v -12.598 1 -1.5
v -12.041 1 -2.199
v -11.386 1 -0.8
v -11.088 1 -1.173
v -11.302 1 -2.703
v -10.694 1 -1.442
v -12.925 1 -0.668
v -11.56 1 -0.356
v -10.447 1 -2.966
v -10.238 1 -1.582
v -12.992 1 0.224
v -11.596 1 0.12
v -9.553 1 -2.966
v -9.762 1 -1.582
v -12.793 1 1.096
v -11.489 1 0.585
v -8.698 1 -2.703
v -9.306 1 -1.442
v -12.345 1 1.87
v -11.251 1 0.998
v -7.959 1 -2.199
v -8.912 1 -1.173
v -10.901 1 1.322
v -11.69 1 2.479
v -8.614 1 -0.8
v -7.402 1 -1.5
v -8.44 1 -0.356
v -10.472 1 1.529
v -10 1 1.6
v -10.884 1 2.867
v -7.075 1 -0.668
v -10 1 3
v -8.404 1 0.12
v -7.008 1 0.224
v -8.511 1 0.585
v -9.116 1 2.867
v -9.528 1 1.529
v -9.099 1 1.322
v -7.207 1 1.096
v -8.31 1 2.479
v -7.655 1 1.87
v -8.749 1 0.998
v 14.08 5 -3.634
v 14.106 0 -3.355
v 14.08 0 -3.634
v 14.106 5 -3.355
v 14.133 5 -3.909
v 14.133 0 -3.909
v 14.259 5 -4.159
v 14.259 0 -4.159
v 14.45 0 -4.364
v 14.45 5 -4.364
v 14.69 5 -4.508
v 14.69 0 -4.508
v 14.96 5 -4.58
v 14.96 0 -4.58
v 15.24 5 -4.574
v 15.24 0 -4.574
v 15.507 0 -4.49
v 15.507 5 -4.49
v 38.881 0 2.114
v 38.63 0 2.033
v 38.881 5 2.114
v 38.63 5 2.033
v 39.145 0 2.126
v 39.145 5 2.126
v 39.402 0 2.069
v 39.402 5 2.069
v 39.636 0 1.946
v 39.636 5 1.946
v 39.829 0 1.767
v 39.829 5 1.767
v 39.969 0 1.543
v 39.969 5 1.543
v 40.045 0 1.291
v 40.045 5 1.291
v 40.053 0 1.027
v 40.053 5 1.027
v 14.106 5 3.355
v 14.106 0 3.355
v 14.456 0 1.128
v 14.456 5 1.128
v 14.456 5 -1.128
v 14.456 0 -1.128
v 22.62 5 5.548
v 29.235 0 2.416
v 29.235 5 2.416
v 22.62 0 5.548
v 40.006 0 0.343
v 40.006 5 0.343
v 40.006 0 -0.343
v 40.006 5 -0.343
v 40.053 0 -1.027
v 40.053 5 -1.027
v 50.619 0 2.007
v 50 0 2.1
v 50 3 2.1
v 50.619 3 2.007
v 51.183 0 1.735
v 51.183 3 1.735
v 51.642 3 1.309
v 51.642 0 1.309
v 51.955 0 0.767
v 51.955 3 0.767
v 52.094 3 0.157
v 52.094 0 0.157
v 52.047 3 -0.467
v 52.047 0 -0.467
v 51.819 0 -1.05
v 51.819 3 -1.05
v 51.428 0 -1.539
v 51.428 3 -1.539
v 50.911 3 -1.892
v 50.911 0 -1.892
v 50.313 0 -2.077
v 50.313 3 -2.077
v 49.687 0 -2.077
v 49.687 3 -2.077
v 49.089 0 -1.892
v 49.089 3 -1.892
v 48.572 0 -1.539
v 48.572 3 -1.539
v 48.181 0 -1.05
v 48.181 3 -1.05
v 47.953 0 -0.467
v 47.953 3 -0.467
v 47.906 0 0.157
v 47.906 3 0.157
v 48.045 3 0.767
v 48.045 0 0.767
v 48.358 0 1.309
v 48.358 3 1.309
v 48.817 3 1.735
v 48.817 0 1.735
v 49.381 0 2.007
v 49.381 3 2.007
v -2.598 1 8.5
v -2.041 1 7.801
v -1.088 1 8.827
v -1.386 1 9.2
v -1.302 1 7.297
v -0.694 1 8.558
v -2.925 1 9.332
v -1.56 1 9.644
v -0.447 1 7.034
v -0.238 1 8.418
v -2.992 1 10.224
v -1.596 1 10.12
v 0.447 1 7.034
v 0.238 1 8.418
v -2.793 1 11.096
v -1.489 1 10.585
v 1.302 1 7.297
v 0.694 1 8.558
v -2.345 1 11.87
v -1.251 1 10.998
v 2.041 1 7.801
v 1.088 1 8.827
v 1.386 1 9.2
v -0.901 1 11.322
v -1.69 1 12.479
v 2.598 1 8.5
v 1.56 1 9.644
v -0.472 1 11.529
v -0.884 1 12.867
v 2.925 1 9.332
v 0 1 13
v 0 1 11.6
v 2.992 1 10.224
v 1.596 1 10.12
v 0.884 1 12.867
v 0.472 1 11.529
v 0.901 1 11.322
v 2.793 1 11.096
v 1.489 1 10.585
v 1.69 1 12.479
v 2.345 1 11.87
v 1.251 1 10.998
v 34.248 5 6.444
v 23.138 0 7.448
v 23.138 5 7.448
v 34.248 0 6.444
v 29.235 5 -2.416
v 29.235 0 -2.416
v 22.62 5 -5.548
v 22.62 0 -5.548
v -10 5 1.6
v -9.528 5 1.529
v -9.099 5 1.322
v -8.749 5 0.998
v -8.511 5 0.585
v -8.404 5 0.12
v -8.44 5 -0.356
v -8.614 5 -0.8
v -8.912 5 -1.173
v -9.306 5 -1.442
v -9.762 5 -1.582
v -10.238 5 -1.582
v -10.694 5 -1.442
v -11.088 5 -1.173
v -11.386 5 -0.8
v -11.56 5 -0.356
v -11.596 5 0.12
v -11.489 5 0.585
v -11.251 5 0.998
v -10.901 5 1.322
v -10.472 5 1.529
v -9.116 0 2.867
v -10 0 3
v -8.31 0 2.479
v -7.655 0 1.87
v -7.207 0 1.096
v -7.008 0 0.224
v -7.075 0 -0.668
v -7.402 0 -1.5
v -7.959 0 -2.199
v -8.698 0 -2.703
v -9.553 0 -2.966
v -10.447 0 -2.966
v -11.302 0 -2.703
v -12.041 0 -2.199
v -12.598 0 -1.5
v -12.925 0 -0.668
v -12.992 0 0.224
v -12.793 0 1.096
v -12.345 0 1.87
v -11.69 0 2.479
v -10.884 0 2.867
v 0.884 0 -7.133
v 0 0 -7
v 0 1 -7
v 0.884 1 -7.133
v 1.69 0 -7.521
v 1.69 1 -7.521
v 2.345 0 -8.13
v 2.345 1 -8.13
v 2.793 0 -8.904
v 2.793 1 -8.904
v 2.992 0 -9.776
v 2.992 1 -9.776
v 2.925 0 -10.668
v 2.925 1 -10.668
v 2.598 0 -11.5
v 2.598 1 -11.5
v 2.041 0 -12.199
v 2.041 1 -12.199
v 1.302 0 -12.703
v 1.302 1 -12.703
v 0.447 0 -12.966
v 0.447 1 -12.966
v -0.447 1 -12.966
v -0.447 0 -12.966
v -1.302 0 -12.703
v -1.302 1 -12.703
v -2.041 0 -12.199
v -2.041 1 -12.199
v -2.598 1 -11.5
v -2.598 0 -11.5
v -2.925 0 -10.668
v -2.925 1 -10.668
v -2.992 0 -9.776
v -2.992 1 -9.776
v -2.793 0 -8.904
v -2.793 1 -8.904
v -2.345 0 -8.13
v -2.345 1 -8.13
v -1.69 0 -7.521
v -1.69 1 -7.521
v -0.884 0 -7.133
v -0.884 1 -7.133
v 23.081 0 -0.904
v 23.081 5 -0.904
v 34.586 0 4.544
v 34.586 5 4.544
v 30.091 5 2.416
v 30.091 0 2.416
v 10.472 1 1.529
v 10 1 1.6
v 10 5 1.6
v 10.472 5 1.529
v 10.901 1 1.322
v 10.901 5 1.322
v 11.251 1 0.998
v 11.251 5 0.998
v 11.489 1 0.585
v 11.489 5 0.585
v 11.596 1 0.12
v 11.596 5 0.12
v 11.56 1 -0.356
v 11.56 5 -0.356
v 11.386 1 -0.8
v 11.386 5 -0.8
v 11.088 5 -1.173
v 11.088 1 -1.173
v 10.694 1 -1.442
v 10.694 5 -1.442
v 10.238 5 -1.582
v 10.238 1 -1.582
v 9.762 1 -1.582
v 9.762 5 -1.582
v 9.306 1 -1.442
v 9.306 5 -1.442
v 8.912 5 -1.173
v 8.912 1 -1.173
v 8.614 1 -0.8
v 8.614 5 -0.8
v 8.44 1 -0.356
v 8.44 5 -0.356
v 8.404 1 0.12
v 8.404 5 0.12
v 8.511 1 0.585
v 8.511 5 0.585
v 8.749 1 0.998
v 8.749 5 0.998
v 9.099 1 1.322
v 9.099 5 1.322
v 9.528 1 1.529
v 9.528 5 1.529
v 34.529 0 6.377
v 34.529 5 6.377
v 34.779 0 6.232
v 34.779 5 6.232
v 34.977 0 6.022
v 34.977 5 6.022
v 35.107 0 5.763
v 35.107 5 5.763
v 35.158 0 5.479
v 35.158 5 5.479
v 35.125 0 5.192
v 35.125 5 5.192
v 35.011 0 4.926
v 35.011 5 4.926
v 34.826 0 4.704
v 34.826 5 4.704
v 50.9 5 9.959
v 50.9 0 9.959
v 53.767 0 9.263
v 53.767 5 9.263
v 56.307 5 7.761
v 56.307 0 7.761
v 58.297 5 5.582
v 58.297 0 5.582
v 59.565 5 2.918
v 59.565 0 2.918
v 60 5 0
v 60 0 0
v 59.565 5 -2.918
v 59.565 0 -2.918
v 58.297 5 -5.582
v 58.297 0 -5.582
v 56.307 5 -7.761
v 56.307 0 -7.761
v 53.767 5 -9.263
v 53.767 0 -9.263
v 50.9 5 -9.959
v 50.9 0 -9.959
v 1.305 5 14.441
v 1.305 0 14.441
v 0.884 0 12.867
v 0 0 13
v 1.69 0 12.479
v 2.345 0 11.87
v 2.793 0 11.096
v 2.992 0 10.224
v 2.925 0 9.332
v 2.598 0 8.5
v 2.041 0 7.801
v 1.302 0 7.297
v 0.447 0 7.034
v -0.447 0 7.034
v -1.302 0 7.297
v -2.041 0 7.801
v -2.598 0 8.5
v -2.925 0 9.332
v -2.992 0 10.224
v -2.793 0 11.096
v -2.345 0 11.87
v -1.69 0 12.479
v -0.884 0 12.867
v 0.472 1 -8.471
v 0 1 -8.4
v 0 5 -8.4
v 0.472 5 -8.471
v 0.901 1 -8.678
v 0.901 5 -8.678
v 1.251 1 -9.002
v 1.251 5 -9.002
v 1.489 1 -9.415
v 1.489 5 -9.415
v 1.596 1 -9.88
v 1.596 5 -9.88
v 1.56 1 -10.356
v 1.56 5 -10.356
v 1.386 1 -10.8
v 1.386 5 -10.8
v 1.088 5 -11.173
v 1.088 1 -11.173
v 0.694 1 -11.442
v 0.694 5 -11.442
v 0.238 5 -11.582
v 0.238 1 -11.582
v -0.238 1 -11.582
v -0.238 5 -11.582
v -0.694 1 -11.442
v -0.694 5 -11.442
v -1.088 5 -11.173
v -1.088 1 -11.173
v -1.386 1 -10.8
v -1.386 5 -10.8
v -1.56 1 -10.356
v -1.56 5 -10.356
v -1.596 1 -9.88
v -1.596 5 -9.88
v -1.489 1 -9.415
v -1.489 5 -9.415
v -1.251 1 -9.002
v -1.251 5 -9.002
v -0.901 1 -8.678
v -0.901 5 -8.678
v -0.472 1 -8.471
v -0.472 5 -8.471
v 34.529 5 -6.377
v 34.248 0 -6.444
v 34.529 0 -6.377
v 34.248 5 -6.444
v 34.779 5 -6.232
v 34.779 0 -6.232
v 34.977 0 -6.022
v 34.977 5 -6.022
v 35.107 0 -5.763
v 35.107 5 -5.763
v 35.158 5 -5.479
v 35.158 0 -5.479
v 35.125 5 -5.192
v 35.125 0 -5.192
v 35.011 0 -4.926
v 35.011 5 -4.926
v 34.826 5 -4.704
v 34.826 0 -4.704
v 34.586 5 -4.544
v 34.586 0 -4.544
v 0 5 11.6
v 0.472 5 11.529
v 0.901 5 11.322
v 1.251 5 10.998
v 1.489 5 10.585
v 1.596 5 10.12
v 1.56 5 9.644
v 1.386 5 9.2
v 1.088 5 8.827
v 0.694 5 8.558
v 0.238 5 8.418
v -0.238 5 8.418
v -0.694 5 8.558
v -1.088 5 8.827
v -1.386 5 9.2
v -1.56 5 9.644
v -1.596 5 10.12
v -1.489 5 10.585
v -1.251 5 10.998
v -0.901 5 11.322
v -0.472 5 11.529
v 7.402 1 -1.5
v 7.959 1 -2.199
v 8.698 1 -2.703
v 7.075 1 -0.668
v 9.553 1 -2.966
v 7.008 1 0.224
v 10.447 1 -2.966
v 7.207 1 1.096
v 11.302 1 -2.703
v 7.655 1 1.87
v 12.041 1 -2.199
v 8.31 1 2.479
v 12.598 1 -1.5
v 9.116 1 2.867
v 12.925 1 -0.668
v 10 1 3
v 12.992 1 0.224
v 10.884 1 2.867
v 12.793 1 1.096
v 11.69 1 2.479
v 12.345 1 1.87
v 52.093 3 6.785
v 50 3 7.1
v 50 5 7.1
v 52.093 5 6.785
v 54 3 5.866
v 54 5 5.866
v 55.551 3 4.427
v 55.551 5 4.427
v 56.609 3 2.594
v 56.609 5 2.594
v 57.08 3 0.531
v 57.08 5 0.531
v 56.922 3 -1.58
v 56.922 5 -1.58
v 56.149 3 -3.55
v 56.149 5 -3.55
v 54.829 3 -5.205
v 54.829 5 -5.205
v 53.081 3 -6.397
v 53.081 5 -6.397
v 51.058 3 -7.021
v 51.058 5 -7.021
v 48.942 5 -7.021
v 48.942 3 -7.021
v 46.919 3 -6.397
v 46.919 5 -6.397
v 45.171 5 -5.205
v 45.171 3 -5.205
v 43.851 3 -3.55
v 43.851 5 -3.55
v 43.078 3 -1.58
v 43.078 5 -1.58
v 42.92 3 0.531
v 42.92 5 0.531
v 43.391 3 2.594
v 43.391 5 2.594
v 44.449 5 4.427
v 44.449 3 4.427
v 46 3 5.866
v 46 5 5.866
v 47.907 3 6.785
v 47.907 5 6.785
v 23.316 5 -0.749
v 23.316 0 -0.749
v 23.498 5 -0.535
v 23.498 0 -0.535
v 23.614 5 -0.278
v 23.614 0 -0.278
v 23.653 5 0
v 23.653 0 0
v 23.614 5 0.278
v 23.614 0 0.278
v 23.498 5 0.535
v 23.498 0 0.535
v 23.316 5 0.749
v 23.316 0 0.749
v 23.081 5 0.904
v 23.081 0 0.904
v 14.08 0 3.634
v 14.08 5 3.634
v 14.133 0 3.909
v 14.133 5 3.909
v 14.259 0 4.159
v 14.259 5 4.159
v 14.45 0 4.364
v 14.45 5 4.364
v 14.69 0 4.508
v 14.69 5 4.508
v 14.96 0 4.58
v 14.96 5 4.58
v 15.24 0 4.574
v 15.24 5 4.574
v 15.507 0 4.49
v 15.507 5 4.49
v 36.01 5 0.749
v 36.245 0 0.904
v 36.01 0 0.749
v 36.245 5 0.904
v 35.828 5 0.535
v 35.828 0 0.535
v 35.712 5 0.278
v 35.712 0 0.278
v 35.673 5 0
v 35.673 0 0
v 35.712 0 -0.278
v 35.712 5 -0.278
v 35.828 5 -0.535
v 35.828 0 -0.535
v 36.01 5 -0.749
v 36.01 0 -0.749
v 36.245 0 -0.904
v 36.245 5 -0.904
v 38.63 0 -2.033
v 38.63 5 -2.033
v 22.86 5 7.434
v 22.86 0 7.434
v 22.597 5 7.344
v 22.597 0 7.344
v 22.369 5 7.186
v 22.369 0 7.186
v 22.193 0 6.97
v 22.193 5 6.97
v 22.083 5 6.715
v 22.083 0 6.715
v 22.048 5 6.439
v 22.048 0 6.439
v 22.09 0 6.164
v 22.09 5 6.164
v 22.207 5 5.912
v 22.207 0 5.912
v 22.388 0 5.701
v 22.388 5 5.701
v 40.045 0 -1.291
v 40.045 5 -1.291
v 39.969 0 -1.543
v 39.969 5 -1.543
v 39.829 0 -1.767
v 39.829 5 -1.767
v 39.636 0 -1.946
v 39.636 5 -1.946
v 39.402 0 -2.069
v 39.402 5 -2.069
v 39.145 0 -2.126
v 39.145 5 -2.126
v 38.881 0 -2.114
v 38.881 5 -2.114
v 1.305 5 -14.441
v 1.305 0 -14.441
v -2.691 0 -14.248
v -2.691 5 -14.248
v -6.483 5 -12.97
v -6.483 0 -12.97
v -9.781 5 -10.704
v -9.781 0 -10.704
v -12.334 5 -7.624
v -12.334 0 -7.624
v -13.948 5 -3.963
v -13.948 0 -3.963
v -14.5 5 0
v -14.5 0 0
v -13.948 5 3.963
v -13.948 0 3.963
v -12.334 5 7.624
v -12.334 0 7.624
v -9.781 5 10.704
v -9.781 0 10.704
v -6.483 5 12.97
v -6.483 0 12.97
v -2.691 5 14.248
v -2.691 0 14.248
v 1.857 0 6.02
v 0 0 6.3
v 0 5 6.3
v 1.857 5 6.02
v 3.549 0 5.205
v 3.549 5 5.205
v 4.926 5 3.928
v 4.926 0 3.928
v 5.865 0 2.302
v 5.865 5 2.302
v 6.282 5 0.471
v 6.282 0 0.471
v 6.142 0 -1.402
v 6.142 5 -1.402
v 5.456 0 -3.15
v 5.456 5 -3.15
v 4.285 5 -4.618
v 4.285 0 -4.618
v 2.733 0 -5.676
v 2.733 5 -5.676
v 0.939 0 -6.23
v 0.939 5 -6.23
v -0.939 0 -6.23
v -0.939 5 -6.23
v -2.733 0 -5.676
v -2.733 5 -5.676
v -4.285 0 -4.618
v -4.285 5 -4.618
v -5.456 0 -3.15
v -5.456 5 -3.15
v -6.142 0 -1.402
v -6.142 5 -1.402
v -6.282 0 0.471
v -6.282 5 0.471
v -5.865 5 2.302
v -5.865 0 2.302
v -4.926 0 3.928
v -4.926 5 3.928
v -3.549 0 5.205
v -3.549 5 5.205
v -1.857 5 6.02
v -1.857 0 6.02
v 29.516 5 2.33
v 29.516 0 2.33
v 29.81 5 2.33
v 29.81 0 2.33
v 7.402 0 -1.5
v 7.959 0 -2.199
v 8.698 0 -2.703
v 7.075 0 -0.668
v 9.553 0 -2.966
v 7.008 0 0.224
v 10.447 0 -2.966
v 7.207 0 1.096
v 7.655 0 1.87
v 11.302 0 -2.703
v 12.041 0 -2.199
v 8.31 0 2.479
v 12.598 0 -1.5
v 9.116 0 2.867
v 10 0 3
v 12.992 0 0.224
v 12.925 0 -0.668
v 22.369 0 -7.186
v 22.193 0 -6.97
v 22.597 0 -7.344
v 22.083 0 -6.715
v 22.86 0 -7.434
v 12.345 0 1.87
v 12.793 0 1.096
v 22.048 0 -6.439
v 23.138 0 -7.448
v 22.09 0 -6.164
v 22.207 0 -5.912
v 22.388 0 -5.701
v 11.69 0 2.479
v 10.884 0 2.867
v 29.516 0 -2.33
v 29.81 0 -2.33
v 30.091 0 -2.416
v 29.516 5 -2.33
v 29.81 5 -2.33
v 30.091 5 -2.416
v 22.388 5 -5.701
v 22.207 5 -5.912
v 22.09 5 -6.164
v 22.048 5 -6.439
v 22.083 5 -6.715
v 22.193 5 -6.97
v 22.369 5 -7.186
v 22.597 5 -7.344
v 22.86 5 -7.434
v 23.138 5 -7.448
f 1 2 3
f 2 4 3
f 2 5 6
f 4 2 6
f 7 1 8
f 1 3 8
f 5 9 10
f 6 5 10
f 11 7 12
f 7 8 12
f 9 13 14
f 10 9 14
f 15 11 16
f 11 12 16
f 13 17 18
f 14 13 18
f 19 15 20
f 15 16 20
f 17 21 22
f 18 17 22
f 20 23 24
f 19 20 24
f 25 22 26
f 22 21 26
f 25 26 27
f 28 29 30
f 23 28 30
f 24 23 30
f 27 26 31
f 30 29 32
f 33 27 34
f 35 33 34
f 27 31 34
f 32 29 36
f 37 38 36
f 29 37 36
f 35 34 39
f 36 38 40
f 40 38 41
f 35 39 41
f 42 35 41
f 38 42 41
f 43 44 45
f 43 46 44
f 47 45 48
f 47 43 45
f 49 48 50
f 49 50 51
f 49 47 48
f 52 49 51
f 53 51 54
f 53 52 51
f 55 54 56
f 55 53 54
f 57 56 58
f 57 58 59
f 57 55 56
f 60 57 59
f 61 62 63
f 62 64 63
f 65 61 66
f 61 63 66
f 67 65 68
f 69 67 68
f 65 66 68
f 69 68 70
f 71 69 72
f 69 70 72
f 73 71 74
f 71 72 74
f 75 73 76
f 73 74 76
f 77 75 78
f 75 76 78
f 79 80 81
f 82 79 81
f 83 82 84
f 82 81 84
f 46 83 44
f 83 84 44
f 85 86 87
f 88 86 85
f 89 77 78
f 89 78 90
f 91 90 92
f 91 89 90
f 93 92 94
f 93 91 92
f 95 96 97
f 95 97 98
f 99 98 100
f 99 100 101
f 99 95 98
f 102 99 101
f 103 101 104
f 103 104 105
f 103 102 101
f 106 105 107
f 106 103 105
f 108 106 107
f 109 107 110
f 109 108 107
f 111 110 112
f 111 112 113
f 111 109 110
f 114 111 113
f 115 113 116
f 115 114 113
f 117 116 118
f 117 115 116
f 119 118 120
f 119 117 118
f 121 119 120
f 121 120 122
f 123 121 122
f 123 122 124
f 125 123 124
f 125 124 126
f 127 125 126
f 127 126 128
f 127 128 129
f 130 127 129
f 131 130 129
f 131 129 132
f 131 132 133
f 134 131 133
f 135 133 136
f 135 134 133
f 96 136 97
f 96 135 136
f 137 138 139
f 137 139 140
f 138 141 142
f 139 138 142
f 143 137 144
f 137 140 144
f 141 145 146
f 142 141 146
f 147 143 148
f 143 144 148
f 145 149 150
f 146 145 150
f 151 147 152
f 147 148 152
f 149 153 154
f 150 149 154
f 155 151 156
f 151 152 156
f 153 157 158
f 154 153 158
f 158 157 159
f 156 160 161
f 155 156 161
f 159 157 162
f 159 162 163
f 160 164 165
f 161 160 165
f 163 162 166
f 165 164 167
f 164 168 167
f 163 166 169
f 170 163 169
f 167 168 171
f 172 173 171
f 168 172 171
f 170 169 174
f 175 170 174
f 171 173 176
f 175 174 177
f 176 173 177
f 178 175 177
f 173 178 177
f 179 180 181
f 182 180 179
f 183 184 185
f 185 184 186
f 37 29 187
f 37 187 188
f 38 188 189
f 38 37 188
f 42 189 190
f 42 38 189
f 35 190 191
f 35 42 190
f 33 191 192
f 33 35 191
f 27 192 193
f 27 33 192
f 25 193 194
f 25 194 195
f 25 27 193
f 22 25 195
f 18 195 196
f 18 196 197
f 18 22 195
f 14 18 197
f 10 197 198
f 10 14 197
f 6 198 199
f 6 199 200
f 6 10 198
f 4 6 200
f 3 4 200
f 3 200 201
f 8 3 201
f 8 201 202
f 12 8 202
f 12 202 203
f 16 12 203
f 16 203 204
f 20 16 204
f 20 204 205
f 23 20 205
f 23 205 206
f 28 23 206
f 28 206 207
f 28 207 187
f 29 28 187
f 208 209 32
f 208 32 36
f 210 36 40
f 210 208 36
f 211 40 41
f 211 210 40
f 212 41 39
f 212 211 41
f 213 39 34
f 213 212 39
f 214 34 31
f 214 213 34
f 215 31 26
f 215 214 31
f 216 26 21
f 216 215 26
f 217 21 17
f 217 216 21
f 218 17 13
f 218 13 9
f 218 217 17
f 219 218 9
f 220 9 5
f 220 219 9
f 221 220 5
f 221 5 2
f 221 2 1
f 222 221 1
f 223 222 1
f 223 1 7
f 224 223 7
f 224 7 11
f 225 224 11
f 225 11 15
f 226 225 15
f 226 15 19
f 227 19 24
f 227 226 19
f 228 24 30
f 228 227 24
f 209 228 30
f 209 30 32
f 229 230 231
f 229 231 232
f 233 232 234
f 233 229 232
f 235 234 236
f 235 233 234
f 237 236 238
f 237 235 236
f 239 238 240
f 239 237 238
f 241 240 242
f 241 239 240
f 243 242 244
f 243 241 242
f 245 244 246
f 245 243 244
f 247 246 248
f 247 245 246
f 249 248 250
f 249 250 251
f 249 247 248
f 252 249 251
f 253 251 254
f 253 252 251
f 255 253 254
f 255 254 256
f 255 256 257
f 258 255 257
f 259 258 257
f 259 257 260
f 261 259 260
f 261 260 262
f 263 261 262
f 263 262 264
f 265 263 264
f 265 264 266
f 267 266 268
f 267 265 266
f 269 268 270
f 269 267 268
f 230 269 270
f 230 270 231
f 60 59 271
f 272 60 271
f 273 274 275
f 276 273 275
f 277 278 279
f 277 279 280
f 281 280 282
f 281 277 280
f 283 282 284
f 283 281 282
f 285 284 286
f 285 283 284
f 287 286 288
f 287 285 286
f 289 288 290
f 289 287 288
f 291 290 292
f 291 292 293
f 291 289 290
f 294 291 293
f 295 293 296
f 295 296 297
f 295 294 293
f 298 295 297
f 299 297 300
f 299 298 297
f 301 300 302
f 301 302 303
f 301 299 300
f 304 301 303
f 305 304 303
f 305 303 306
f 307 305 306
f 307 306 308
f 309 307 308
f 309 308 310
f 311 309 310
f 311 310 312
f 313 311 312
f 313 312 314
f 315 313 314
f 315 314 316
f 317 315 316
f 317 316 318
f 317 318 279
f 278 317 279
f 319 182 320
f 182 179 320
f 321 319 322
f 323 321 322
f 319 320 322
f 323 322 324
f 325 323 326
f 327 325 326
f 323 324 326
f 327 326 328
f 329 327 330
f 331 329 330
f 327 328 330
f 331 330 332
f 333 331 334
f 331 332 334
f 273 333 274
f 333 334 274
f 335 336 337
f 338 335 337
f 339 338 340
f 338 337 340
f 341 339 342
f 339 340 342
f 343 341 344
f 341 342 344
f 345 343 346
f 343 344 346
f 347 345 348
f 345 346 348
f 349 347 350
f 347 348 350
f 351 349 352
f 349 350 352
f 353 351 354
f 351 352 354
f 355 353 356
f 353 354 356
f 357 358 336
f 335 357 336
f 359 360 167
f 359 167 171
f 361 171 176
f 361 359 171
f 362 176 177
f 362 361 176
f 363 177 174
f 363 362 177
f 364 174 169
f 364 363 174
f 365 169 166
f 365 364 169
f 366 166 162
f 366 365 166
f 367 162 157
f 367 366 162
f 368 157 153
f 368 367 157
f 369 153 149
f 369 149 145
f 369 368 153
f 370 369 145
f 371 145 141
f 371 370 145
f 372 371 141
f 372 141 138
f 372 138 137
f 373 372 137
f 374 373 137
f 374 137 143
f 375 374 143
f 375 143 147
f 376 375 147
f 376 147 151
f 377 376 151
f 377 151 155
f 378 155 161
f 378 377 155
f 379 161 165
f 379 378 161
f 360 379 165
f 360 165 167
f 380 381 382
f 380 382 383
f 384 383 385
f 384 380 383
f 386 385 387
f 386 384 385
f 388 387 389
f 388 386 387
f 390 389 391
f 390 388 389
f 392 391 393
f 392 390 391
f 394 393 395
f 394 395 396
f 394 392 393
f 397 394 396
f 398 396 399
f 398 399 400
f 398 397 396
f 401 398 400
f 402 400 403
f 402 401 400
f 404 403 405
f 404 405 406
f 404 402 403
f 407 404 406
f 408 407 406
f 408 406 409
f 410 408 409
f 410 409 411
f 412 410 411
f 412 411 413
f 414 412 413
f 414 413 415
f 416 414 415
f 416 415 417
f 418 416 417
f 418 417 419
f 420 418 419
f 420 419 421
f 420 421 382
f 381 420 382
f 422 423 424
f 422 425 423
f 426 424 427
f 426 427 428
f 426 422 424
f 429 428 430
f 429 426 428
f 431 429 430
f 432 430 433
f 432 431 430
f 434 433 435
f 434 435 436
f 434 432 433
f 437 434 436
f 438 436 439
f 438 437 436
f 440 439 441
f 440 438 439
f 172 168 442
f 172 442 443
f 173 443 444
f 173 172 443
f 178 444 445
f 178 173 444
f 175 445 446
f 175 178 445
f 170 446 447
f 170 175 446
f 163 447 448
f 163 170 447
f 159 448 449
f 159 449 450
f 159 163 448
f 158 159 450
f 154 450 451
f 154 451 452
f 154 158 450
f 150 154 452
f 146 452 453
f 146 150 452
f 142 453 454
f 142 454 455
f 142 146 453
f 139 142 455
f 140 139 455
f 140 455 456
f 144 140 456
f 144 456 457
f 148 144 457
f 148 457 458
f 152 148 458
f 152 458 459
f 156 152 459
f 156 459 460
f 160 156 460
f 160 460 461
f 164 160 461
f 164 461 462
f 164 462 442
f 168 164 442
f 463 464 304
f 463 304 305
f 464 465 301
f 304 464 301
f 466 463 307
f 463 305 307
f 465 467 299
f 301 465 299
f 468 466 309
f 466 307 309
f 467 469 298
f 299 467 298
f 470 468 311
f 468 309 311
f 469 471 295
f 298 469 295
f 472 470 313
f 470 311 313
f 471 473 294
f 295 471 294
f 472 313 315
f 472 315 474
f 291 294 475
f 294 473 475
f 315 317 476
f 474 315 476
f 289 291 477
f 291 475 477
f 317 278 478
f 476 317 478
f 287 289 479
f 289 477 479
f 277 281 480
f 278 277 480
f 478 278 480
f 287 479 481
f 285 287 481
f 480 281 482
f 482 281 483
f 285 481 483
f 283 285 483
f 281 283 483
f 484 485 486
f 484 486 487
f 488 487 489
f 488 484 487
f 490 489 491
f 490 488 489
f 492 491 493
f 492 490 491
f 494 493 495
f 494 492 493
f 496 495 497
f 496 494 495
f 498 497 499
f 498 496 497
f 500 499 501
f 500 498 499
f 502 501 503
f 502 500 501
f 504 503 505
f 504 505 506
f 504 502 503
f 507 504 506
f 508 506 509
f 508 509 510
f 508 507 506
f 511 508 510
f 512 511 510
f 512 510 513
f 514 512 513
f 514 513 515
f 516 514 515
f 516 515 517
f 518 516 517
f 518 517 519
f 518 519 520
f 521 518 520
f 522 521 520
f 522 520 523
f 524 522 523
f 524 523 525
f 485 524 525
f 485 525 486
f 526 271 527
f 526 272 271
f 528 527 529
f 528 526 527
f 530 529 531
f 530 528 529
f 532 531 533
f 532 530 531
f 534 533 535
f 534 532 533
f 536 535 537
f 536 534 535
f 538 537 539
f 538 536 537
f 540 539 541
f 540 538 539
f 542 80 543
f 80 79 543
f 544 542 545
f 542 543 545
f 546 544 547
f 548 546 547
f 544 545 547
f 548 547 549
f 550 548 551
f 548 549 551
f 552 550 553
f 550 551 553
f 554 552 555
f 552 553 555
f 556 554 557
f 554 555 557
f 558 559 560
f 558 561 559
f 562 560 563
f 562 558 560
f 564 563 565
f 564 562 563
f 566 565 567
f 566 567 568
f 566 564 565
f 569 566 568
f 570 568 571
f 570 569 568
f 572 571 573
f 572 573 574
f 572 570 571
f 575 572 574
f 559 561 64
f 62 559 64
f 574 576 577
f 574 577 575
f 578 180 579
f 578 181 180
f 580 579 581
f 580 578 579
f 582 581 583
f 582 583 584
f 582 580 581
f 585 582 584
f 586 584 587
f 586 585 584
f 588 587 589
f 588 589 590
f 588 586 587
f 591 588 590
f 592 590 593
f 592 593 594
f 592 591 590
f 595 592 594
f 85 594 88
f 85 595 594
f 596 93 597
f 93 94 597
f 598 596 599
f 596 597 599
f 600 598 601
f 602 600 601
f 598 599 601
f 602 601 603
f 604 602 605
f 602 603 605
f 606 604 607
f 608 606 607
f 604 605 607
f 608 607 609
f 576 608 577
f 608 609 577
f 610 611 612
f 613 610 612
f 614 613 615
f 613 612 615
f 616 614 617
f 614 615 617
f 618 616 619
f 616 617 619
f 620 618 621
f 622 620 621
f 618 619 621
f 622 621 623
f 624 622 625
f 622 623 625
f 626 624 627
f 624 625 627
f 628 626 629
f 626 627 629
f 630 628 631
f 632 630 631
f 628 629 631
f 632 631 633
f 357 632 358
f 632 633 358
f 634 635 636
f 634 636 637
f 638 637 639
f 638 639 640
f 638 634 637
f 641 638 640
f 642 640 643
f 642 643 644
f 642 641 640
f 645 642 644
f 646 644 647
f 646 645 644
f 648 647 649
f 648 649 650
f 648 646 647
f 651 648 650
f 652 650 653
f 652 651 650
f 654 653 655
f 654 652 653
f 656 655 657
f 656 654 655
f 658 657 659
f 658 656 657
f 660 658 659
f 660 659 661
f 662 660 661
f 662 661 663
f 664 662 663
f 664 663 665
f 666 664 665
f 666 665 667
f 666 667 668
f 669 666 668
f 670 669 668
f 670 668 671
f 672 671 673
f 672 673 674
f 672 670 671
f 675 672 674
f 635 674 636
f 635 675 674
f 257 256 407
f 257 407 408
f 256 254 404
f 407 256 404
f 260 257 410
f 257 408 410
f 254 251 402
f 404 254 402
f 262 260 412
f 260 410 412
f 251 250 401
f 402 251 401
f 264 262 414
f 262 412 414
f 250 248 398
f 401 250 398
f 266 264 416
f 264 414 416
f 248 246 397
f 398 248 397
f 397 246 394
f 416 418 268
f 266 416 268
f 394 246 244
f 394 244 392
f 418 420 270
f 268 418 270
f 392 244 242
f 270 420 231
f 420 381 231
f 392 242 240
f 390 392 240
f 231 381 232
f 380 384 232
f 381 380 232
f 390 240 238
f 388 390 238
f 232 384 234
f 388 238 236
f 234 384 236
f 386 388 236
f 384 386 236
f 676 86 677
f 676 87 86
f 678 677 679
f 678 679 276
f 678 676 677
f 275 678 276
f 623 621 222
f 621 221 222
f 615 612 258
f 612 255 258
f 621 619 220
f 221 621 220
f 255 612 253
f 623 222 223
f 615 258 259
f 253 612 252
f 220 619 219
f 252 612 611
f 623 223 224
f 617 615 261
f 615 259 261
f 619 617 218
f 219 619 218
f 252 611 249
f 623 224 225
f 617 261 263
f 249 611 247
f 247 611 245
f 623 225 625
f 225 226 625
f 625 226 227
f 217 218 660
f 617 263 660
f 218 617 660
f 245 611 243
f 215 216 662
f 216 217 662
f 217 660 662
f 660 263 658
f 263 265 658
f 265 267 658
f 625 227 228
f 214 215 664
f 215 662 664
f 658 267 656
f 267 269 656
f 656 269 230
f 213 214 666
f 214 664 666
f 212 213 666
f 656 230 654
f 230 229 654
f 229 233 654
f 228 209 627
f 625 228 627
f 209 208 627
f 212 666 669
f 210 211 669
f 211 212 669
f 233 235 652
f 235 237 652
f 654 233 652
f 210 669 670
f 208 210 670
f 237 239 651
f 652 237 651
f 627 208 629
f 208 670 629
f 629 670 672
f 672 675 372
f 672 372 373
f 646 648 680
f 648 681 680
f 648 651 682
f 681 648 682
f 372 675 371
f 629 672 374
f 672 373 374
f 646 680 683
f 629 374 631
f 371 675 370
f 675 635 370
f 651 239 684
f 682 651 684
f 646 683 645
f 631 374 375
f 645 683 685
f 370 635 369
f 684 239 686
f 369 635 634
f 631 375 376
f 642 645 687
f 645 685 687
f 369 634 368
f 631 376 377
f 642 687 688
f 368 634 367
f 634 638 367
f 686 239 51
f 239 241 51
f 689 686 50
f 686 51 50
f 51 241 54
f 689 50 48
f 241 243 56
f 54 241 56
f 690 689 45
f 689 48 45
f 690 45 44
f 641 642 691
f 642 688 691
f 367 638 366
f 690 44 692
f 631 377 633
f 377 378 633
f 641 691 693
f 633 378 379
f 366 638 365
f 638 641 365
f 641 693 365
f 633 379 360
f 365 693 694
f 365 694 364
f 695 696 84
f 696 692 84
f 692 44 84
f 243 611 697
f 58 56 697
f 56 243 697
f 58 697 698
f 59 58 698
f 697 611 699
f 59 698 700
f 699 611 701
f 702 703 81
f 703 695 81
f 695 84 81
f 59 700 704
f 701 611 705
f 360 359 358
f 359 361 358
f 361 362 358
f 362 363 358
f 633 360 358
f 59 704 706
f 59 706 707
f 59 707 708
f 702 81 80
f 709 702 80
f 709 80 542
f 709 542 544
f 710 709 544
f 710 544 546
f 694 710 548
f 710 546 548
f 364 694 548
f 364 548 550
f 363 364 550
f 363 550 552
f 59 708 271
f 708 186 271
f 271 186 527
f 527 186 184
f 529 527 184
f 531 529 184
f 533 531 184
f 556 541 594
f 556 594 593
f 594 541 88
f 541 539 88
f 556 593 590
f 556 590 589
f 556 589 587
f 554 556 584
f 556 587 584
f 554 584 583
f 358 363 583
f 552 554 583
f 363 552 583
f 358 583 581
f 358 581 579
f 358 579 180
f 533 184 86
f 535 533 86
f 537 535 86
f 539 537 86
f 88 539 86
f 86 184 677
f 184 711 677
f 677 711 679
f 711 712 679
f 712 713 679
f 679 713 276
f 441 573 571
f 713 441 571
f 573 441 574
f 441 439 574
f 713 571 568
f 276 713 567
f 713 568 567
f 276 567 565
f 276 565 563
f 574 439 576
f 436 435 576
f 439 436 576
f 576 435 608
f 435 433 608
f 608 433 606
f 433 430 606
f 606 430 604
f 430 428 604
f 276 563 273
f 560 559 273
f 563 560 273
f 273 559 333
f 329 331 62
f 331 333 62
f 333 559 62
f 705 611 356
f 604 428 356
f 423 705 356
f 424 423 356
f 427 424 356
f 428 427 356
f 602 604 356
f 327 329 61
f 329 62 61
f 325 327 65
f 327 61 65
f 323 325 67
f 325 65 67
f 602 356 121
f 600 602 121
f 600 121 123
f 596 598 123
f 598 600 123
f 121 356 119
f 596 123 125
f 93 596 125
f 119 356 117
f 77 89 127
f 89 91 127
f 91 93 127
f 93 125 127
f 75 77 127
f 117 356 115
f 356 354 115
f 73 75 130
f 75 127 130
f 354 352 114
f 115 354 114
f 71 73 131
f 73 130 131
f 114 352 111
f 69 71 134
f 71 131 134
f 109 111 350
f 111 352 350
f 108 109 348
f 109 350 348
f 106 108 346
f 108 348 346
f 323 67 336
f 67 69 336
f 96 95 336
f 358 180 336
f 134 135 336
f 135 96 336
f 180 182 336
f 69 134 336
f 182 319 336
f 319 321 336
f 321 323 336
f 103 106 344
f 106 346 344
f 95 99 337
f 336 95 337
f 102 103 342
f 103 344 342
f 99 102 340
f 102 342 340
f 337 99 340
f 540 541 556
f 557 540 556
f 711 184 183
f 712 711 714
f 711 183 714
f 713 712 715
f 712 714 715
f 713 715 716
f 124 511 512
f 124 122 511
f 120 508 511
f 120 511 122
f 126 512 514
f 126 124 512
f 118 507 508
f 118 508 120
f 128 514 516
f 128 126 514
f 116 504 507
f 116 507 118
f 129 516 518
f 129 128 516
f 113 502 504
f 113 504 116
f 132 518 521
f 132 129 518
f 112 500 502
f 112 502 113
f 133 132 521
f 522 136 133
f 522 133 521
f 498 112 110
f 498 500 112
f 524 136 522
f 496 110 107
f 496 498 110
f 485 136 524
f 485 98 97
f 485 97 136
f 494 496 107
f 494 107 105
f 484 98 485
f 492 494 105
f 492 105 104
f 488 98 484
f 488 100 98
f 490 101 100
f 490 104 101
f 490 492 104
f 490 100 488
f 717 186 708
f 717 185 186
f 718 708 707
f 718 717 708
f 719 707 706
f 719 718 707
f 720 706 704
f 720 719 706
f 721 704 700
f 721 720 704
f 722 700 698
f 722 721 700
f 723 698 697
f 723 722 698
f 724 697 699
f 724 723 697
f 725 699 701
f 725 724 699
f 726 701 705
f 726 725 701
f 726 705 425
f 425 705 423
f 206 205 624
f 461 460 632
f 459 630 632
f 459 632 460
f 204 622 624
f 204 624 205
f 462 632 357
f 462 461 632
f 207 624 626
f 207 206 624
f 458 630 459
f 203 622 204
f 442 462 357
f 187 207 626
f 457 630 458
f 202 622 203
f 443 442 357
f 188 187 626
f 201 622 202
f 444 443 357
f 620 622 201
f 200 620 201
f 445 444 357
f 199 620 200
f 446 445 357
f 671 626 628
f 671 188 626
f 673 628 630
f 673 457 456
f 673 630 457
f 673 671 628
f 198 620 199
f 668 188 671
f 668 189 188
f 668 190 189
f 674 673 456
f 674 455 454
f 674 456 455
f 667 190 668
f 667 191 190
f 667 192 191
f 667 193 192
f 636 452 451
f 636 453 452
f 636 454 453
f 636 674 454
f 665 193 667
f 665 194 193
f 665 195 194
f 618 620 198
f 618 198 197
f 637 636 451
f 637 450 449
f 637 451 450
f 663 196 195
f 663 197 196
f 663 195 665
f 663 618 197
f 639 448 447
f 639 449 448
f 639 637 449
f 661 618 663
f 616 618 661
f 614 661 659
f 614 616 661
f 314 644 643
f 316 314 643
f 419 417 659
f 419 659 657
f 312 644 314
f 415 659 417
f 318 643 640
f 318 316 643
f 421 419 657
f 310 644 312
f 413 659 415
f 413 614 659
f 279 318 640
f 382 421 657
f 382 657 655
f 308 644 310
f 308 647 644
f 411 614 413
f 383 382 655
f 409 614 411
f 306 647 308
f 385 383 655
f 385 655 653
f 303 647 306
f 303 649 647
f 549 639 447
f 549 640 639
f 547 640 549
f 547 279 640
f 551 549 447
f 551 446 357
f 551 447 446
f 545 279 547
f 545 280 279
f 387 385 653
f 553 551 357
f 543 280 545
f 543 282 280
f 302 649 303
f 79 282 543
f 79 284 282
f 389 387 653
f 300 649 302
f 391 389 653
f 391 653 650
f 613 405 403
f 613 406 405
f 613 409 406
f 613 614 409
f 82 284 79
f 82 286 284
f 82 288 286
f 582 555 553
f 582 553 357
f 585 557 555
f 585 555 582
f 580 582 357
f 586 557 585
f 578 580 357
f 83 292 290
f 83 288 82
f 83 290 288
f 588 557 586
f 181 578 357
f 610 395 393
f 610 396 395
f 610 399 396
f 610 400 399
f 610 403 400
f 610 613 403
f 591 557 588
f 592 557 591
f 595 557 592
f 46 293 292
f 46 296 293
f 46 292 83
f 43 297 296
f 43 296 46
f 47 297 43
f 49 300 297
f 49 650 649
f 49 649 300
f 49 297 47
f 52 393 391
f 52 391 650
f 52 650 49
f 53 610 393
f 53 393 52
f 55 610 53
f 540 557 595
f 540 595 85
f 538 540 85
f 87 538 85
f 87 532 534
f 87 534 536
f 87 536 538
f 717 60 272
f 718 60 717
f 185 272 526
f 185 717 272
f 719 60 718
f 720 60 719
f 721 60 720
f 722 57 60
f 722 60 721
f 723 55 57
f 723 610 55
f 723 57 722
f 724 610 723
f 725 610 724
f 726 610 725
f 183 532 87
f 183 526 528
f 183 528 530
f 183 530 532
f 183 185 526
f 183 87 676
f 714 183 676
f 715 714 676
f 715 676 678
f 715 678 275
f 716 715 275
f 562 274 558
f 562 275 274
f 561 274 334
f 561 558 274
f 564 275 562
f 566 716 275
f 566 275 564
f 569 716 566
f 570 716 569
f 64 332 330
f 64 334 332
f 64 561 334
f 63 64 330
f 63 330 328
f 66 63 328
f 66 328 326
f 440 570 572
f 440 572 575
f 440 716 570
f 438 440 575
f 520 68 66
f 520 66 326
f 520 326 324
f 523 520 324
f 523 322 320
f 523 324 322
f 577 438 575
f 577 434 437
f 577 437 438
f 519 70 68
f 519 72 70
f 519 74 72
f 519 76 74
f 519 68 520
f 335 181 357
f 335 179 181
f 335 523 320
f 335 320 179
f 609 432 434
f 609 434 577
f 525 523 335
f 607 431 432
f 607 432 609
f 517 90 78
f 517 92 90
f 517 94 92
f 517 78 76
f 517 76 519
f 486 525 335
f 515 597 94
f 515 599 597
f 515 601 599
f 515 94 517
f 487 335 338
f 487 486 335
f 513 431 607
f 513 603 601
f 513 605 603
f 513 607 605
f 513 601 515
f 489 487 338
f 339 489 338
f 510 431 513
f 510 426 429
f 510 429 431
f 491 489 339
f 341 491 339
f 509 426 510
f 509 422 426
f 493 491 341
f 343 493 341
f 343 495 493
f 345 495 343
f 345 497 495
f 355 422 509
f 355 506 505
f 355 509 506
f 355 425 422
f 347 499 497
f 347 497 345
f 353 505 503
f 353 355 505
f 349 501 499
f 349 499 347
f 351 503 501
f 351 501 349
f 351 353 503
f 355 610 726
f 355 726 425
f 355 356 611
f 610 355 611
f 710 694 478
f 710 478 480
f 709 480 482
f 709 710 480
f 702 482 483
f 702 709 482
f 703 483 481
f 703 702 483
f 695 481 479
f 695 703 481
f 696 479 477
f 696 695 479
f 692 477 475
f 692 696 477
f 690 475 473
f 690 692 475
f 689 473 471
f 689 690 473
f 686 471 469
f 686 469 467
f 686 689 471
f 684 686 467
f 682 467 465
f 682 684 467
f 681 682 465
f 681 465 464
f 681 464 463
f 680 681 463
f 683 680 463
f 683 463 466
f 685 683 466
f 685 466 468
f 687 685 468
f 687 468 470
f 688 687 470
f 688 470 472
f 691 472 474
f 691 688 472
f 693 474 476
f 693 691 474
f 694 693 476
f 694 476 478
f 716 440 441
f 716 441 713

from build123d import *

# Parameters (mm, degrees)
SKETCH_1_R          = 1.6
SKETCH_1_R_2        = 6.3
SKETCH_1_R_3        = 7.1
EXTRUDE_1_DEPTH     = 5
SKETCH_1_3_R        = 7.1
SKETCH_1_3_R_2      = 2.1
EXTRUDE_2_DEPTH     = 3
FILLET_1_R          = 1
FILLET_2_R          = 1
FILLET_3_R          = 1
FILLET_4_R          = 1
SKETCH_2_R          = 3
CUT_EXTRUDE_1_DEPTH = 1


with BuildPart() as part:
    # 草图1 → 凸台-拉伸1 (new body)
    with BuildSketch(Plane(origin=(0, 0, 0), x_dir=(1, 0, 0), z_dir=(0, 1, 0))):
        with BuildLine():
            ThreePointArc((1.305, 14.441155598), (-14.5, 0), (1.305, -14.441155598))
            Line((1.305, -14.441155598), (50.9, -9.959417654))
            ThreePointArc((50.9, -9.959417654), (60, 0), (50.9, 9.959417654))
            Line((50.9, 9.959417654), (1.305, 14.441155598))
        make_face()
        with Locations((0, -10)):
            Circle(SKETCH_1_R, mode=Mode.SUBTRACT)
        with Locations((-10, 0)):
            Circle(SKETCH_1_R, mode=Mode.SUBTRACT)
        Circle(SKETCH_1_R_2, mode=Mode.SUBTRACT)
        with Locations((10, 0)):
            Circle(SKETCH_1_R, mode=Mode.SUBTRACT)
        with BuildLine():
            ThreePointArc((13.42623574, -5.475965106), (14.5, 0), (13.42623574, 5.475965106))
            Line((13.42623574, 5.475965106), (24.990033856, 0))
            Line((24.990033856, 0), (13.42623574, -5.475965106))
        make_face(mode=Mode.SUBTRACT)
        Polygon((37.900667884, -6.113750926), (17.540160593, -7.953663379), (29.663119838, -2.212910976), align=None, mode=Mode.SUBTRACT)
        with Locations((50, 0)):
            Circle(SKETCH_1_R_3, mode=Mode.SUBTRACT)
        with Locations((0, 10)):
            Circle(SKETCH_1_R, mode=Mode.SUBTRACT)
        with BuildLine():
            Line((40.424641065, -2.88314087), (34.33620582, 0))
            Line((34.33620582, 0), (40.424641065, 2.88314087))
            ThreePointArc((40.424641065, 2.88314087), (40, 0), (40.424641065, -2.88314087))
        make_face(mode=Mode.SUBTRACT)
        Polygon((29.663119838, 2.212910976), (17.540160593, 7.953663379), (37.900667884, 6.113750926), align=None, mode=Mode.SUBTRACT)
    extrude(amount=EXTRUDE_1_DEPTH)

    # 草图1<3> → 凸台-拉伸2 (add)
    with BuildSketch(Plane(origin=(0, 0, 0), x_dir=(1, 0, 0), z_dir=(0, 1, 0))):
        with Locations((50, 0)):
            Circle(SKETCH_1_3_R)
        with Locations((50, 0)):
            Circle(SKETCH_1_3_R_2, mode=Mode.SUBTRACT)
    extrude(amount=EXTRUDE_2_DEPTH)

    # 圆角1
    fillet_1_edges = [part.edges().sort_by_distance(p)[0] for p in [
        (34.33620582, 2.5, 0),
        (40.424641065, 2.5, -2.88314087),
        (40.424641065, 2.5, 2.88314087),
    ]]
    fillet(fillet_1_edges, radius=FILLET_1_R)

    # 圆角2
    fillet_2_edges = [part.edges().sort_by_distance(p)[0] for p in [
        (29.663119838, 2.5, 2.212910976),
        (17.540160593, 2.5, 7.953663379),
        (37.900667884, 2.5, 6.113750926),
    ]]
    fillet(fillet_2_edges, radius=FILLET_2_R)

    # 圆角3
    fillet_3_edges = [part.edges().sort_by_distance(p)[0] for p in [
        (17.540160593, 2.5, -7.953663379),
        (29.663119838, 2.5, -2.212910976),
        (37.900667884, 2.5, -6.113750926),
    ]]
    fillet(fillet_3_edges, radius=FILLET_3_R)

    # 圆角4
    fillet_4_edges = [part.edges().sort_by_distance(p)[0] for p in [
        (13.42623574, 2.5, -5.475965106),
        (24.990033856, 2.5, 0),
        (13.42623574, 2.5, 5.475965106),
    ]]
    fillet(fillet_4_edges, radius=FILLET_4_R)

    # 草图2 → 切除-拉伸1 (cut)
    with BuildSketch(Plane(origin=(0, 0, 0), x_dir=(1, 0, 0), z_dir=(0, 1, 0))):
        with Locations((0, -10)):
            Circle(SKETCH_2_R)
        with Locations((-10, 0)):
            Circle(SKETCH_2_R)
        with Locations((0, 10)):
            Circle(SKETCH_2_R)
        with Locations((10, 0)):
            Circle(SKETCH_2_R)
    extrude(amount=CUT_EXTRUDE_1_DEPTH, mode=Mode.SUBTRACT)


solid = part.part
